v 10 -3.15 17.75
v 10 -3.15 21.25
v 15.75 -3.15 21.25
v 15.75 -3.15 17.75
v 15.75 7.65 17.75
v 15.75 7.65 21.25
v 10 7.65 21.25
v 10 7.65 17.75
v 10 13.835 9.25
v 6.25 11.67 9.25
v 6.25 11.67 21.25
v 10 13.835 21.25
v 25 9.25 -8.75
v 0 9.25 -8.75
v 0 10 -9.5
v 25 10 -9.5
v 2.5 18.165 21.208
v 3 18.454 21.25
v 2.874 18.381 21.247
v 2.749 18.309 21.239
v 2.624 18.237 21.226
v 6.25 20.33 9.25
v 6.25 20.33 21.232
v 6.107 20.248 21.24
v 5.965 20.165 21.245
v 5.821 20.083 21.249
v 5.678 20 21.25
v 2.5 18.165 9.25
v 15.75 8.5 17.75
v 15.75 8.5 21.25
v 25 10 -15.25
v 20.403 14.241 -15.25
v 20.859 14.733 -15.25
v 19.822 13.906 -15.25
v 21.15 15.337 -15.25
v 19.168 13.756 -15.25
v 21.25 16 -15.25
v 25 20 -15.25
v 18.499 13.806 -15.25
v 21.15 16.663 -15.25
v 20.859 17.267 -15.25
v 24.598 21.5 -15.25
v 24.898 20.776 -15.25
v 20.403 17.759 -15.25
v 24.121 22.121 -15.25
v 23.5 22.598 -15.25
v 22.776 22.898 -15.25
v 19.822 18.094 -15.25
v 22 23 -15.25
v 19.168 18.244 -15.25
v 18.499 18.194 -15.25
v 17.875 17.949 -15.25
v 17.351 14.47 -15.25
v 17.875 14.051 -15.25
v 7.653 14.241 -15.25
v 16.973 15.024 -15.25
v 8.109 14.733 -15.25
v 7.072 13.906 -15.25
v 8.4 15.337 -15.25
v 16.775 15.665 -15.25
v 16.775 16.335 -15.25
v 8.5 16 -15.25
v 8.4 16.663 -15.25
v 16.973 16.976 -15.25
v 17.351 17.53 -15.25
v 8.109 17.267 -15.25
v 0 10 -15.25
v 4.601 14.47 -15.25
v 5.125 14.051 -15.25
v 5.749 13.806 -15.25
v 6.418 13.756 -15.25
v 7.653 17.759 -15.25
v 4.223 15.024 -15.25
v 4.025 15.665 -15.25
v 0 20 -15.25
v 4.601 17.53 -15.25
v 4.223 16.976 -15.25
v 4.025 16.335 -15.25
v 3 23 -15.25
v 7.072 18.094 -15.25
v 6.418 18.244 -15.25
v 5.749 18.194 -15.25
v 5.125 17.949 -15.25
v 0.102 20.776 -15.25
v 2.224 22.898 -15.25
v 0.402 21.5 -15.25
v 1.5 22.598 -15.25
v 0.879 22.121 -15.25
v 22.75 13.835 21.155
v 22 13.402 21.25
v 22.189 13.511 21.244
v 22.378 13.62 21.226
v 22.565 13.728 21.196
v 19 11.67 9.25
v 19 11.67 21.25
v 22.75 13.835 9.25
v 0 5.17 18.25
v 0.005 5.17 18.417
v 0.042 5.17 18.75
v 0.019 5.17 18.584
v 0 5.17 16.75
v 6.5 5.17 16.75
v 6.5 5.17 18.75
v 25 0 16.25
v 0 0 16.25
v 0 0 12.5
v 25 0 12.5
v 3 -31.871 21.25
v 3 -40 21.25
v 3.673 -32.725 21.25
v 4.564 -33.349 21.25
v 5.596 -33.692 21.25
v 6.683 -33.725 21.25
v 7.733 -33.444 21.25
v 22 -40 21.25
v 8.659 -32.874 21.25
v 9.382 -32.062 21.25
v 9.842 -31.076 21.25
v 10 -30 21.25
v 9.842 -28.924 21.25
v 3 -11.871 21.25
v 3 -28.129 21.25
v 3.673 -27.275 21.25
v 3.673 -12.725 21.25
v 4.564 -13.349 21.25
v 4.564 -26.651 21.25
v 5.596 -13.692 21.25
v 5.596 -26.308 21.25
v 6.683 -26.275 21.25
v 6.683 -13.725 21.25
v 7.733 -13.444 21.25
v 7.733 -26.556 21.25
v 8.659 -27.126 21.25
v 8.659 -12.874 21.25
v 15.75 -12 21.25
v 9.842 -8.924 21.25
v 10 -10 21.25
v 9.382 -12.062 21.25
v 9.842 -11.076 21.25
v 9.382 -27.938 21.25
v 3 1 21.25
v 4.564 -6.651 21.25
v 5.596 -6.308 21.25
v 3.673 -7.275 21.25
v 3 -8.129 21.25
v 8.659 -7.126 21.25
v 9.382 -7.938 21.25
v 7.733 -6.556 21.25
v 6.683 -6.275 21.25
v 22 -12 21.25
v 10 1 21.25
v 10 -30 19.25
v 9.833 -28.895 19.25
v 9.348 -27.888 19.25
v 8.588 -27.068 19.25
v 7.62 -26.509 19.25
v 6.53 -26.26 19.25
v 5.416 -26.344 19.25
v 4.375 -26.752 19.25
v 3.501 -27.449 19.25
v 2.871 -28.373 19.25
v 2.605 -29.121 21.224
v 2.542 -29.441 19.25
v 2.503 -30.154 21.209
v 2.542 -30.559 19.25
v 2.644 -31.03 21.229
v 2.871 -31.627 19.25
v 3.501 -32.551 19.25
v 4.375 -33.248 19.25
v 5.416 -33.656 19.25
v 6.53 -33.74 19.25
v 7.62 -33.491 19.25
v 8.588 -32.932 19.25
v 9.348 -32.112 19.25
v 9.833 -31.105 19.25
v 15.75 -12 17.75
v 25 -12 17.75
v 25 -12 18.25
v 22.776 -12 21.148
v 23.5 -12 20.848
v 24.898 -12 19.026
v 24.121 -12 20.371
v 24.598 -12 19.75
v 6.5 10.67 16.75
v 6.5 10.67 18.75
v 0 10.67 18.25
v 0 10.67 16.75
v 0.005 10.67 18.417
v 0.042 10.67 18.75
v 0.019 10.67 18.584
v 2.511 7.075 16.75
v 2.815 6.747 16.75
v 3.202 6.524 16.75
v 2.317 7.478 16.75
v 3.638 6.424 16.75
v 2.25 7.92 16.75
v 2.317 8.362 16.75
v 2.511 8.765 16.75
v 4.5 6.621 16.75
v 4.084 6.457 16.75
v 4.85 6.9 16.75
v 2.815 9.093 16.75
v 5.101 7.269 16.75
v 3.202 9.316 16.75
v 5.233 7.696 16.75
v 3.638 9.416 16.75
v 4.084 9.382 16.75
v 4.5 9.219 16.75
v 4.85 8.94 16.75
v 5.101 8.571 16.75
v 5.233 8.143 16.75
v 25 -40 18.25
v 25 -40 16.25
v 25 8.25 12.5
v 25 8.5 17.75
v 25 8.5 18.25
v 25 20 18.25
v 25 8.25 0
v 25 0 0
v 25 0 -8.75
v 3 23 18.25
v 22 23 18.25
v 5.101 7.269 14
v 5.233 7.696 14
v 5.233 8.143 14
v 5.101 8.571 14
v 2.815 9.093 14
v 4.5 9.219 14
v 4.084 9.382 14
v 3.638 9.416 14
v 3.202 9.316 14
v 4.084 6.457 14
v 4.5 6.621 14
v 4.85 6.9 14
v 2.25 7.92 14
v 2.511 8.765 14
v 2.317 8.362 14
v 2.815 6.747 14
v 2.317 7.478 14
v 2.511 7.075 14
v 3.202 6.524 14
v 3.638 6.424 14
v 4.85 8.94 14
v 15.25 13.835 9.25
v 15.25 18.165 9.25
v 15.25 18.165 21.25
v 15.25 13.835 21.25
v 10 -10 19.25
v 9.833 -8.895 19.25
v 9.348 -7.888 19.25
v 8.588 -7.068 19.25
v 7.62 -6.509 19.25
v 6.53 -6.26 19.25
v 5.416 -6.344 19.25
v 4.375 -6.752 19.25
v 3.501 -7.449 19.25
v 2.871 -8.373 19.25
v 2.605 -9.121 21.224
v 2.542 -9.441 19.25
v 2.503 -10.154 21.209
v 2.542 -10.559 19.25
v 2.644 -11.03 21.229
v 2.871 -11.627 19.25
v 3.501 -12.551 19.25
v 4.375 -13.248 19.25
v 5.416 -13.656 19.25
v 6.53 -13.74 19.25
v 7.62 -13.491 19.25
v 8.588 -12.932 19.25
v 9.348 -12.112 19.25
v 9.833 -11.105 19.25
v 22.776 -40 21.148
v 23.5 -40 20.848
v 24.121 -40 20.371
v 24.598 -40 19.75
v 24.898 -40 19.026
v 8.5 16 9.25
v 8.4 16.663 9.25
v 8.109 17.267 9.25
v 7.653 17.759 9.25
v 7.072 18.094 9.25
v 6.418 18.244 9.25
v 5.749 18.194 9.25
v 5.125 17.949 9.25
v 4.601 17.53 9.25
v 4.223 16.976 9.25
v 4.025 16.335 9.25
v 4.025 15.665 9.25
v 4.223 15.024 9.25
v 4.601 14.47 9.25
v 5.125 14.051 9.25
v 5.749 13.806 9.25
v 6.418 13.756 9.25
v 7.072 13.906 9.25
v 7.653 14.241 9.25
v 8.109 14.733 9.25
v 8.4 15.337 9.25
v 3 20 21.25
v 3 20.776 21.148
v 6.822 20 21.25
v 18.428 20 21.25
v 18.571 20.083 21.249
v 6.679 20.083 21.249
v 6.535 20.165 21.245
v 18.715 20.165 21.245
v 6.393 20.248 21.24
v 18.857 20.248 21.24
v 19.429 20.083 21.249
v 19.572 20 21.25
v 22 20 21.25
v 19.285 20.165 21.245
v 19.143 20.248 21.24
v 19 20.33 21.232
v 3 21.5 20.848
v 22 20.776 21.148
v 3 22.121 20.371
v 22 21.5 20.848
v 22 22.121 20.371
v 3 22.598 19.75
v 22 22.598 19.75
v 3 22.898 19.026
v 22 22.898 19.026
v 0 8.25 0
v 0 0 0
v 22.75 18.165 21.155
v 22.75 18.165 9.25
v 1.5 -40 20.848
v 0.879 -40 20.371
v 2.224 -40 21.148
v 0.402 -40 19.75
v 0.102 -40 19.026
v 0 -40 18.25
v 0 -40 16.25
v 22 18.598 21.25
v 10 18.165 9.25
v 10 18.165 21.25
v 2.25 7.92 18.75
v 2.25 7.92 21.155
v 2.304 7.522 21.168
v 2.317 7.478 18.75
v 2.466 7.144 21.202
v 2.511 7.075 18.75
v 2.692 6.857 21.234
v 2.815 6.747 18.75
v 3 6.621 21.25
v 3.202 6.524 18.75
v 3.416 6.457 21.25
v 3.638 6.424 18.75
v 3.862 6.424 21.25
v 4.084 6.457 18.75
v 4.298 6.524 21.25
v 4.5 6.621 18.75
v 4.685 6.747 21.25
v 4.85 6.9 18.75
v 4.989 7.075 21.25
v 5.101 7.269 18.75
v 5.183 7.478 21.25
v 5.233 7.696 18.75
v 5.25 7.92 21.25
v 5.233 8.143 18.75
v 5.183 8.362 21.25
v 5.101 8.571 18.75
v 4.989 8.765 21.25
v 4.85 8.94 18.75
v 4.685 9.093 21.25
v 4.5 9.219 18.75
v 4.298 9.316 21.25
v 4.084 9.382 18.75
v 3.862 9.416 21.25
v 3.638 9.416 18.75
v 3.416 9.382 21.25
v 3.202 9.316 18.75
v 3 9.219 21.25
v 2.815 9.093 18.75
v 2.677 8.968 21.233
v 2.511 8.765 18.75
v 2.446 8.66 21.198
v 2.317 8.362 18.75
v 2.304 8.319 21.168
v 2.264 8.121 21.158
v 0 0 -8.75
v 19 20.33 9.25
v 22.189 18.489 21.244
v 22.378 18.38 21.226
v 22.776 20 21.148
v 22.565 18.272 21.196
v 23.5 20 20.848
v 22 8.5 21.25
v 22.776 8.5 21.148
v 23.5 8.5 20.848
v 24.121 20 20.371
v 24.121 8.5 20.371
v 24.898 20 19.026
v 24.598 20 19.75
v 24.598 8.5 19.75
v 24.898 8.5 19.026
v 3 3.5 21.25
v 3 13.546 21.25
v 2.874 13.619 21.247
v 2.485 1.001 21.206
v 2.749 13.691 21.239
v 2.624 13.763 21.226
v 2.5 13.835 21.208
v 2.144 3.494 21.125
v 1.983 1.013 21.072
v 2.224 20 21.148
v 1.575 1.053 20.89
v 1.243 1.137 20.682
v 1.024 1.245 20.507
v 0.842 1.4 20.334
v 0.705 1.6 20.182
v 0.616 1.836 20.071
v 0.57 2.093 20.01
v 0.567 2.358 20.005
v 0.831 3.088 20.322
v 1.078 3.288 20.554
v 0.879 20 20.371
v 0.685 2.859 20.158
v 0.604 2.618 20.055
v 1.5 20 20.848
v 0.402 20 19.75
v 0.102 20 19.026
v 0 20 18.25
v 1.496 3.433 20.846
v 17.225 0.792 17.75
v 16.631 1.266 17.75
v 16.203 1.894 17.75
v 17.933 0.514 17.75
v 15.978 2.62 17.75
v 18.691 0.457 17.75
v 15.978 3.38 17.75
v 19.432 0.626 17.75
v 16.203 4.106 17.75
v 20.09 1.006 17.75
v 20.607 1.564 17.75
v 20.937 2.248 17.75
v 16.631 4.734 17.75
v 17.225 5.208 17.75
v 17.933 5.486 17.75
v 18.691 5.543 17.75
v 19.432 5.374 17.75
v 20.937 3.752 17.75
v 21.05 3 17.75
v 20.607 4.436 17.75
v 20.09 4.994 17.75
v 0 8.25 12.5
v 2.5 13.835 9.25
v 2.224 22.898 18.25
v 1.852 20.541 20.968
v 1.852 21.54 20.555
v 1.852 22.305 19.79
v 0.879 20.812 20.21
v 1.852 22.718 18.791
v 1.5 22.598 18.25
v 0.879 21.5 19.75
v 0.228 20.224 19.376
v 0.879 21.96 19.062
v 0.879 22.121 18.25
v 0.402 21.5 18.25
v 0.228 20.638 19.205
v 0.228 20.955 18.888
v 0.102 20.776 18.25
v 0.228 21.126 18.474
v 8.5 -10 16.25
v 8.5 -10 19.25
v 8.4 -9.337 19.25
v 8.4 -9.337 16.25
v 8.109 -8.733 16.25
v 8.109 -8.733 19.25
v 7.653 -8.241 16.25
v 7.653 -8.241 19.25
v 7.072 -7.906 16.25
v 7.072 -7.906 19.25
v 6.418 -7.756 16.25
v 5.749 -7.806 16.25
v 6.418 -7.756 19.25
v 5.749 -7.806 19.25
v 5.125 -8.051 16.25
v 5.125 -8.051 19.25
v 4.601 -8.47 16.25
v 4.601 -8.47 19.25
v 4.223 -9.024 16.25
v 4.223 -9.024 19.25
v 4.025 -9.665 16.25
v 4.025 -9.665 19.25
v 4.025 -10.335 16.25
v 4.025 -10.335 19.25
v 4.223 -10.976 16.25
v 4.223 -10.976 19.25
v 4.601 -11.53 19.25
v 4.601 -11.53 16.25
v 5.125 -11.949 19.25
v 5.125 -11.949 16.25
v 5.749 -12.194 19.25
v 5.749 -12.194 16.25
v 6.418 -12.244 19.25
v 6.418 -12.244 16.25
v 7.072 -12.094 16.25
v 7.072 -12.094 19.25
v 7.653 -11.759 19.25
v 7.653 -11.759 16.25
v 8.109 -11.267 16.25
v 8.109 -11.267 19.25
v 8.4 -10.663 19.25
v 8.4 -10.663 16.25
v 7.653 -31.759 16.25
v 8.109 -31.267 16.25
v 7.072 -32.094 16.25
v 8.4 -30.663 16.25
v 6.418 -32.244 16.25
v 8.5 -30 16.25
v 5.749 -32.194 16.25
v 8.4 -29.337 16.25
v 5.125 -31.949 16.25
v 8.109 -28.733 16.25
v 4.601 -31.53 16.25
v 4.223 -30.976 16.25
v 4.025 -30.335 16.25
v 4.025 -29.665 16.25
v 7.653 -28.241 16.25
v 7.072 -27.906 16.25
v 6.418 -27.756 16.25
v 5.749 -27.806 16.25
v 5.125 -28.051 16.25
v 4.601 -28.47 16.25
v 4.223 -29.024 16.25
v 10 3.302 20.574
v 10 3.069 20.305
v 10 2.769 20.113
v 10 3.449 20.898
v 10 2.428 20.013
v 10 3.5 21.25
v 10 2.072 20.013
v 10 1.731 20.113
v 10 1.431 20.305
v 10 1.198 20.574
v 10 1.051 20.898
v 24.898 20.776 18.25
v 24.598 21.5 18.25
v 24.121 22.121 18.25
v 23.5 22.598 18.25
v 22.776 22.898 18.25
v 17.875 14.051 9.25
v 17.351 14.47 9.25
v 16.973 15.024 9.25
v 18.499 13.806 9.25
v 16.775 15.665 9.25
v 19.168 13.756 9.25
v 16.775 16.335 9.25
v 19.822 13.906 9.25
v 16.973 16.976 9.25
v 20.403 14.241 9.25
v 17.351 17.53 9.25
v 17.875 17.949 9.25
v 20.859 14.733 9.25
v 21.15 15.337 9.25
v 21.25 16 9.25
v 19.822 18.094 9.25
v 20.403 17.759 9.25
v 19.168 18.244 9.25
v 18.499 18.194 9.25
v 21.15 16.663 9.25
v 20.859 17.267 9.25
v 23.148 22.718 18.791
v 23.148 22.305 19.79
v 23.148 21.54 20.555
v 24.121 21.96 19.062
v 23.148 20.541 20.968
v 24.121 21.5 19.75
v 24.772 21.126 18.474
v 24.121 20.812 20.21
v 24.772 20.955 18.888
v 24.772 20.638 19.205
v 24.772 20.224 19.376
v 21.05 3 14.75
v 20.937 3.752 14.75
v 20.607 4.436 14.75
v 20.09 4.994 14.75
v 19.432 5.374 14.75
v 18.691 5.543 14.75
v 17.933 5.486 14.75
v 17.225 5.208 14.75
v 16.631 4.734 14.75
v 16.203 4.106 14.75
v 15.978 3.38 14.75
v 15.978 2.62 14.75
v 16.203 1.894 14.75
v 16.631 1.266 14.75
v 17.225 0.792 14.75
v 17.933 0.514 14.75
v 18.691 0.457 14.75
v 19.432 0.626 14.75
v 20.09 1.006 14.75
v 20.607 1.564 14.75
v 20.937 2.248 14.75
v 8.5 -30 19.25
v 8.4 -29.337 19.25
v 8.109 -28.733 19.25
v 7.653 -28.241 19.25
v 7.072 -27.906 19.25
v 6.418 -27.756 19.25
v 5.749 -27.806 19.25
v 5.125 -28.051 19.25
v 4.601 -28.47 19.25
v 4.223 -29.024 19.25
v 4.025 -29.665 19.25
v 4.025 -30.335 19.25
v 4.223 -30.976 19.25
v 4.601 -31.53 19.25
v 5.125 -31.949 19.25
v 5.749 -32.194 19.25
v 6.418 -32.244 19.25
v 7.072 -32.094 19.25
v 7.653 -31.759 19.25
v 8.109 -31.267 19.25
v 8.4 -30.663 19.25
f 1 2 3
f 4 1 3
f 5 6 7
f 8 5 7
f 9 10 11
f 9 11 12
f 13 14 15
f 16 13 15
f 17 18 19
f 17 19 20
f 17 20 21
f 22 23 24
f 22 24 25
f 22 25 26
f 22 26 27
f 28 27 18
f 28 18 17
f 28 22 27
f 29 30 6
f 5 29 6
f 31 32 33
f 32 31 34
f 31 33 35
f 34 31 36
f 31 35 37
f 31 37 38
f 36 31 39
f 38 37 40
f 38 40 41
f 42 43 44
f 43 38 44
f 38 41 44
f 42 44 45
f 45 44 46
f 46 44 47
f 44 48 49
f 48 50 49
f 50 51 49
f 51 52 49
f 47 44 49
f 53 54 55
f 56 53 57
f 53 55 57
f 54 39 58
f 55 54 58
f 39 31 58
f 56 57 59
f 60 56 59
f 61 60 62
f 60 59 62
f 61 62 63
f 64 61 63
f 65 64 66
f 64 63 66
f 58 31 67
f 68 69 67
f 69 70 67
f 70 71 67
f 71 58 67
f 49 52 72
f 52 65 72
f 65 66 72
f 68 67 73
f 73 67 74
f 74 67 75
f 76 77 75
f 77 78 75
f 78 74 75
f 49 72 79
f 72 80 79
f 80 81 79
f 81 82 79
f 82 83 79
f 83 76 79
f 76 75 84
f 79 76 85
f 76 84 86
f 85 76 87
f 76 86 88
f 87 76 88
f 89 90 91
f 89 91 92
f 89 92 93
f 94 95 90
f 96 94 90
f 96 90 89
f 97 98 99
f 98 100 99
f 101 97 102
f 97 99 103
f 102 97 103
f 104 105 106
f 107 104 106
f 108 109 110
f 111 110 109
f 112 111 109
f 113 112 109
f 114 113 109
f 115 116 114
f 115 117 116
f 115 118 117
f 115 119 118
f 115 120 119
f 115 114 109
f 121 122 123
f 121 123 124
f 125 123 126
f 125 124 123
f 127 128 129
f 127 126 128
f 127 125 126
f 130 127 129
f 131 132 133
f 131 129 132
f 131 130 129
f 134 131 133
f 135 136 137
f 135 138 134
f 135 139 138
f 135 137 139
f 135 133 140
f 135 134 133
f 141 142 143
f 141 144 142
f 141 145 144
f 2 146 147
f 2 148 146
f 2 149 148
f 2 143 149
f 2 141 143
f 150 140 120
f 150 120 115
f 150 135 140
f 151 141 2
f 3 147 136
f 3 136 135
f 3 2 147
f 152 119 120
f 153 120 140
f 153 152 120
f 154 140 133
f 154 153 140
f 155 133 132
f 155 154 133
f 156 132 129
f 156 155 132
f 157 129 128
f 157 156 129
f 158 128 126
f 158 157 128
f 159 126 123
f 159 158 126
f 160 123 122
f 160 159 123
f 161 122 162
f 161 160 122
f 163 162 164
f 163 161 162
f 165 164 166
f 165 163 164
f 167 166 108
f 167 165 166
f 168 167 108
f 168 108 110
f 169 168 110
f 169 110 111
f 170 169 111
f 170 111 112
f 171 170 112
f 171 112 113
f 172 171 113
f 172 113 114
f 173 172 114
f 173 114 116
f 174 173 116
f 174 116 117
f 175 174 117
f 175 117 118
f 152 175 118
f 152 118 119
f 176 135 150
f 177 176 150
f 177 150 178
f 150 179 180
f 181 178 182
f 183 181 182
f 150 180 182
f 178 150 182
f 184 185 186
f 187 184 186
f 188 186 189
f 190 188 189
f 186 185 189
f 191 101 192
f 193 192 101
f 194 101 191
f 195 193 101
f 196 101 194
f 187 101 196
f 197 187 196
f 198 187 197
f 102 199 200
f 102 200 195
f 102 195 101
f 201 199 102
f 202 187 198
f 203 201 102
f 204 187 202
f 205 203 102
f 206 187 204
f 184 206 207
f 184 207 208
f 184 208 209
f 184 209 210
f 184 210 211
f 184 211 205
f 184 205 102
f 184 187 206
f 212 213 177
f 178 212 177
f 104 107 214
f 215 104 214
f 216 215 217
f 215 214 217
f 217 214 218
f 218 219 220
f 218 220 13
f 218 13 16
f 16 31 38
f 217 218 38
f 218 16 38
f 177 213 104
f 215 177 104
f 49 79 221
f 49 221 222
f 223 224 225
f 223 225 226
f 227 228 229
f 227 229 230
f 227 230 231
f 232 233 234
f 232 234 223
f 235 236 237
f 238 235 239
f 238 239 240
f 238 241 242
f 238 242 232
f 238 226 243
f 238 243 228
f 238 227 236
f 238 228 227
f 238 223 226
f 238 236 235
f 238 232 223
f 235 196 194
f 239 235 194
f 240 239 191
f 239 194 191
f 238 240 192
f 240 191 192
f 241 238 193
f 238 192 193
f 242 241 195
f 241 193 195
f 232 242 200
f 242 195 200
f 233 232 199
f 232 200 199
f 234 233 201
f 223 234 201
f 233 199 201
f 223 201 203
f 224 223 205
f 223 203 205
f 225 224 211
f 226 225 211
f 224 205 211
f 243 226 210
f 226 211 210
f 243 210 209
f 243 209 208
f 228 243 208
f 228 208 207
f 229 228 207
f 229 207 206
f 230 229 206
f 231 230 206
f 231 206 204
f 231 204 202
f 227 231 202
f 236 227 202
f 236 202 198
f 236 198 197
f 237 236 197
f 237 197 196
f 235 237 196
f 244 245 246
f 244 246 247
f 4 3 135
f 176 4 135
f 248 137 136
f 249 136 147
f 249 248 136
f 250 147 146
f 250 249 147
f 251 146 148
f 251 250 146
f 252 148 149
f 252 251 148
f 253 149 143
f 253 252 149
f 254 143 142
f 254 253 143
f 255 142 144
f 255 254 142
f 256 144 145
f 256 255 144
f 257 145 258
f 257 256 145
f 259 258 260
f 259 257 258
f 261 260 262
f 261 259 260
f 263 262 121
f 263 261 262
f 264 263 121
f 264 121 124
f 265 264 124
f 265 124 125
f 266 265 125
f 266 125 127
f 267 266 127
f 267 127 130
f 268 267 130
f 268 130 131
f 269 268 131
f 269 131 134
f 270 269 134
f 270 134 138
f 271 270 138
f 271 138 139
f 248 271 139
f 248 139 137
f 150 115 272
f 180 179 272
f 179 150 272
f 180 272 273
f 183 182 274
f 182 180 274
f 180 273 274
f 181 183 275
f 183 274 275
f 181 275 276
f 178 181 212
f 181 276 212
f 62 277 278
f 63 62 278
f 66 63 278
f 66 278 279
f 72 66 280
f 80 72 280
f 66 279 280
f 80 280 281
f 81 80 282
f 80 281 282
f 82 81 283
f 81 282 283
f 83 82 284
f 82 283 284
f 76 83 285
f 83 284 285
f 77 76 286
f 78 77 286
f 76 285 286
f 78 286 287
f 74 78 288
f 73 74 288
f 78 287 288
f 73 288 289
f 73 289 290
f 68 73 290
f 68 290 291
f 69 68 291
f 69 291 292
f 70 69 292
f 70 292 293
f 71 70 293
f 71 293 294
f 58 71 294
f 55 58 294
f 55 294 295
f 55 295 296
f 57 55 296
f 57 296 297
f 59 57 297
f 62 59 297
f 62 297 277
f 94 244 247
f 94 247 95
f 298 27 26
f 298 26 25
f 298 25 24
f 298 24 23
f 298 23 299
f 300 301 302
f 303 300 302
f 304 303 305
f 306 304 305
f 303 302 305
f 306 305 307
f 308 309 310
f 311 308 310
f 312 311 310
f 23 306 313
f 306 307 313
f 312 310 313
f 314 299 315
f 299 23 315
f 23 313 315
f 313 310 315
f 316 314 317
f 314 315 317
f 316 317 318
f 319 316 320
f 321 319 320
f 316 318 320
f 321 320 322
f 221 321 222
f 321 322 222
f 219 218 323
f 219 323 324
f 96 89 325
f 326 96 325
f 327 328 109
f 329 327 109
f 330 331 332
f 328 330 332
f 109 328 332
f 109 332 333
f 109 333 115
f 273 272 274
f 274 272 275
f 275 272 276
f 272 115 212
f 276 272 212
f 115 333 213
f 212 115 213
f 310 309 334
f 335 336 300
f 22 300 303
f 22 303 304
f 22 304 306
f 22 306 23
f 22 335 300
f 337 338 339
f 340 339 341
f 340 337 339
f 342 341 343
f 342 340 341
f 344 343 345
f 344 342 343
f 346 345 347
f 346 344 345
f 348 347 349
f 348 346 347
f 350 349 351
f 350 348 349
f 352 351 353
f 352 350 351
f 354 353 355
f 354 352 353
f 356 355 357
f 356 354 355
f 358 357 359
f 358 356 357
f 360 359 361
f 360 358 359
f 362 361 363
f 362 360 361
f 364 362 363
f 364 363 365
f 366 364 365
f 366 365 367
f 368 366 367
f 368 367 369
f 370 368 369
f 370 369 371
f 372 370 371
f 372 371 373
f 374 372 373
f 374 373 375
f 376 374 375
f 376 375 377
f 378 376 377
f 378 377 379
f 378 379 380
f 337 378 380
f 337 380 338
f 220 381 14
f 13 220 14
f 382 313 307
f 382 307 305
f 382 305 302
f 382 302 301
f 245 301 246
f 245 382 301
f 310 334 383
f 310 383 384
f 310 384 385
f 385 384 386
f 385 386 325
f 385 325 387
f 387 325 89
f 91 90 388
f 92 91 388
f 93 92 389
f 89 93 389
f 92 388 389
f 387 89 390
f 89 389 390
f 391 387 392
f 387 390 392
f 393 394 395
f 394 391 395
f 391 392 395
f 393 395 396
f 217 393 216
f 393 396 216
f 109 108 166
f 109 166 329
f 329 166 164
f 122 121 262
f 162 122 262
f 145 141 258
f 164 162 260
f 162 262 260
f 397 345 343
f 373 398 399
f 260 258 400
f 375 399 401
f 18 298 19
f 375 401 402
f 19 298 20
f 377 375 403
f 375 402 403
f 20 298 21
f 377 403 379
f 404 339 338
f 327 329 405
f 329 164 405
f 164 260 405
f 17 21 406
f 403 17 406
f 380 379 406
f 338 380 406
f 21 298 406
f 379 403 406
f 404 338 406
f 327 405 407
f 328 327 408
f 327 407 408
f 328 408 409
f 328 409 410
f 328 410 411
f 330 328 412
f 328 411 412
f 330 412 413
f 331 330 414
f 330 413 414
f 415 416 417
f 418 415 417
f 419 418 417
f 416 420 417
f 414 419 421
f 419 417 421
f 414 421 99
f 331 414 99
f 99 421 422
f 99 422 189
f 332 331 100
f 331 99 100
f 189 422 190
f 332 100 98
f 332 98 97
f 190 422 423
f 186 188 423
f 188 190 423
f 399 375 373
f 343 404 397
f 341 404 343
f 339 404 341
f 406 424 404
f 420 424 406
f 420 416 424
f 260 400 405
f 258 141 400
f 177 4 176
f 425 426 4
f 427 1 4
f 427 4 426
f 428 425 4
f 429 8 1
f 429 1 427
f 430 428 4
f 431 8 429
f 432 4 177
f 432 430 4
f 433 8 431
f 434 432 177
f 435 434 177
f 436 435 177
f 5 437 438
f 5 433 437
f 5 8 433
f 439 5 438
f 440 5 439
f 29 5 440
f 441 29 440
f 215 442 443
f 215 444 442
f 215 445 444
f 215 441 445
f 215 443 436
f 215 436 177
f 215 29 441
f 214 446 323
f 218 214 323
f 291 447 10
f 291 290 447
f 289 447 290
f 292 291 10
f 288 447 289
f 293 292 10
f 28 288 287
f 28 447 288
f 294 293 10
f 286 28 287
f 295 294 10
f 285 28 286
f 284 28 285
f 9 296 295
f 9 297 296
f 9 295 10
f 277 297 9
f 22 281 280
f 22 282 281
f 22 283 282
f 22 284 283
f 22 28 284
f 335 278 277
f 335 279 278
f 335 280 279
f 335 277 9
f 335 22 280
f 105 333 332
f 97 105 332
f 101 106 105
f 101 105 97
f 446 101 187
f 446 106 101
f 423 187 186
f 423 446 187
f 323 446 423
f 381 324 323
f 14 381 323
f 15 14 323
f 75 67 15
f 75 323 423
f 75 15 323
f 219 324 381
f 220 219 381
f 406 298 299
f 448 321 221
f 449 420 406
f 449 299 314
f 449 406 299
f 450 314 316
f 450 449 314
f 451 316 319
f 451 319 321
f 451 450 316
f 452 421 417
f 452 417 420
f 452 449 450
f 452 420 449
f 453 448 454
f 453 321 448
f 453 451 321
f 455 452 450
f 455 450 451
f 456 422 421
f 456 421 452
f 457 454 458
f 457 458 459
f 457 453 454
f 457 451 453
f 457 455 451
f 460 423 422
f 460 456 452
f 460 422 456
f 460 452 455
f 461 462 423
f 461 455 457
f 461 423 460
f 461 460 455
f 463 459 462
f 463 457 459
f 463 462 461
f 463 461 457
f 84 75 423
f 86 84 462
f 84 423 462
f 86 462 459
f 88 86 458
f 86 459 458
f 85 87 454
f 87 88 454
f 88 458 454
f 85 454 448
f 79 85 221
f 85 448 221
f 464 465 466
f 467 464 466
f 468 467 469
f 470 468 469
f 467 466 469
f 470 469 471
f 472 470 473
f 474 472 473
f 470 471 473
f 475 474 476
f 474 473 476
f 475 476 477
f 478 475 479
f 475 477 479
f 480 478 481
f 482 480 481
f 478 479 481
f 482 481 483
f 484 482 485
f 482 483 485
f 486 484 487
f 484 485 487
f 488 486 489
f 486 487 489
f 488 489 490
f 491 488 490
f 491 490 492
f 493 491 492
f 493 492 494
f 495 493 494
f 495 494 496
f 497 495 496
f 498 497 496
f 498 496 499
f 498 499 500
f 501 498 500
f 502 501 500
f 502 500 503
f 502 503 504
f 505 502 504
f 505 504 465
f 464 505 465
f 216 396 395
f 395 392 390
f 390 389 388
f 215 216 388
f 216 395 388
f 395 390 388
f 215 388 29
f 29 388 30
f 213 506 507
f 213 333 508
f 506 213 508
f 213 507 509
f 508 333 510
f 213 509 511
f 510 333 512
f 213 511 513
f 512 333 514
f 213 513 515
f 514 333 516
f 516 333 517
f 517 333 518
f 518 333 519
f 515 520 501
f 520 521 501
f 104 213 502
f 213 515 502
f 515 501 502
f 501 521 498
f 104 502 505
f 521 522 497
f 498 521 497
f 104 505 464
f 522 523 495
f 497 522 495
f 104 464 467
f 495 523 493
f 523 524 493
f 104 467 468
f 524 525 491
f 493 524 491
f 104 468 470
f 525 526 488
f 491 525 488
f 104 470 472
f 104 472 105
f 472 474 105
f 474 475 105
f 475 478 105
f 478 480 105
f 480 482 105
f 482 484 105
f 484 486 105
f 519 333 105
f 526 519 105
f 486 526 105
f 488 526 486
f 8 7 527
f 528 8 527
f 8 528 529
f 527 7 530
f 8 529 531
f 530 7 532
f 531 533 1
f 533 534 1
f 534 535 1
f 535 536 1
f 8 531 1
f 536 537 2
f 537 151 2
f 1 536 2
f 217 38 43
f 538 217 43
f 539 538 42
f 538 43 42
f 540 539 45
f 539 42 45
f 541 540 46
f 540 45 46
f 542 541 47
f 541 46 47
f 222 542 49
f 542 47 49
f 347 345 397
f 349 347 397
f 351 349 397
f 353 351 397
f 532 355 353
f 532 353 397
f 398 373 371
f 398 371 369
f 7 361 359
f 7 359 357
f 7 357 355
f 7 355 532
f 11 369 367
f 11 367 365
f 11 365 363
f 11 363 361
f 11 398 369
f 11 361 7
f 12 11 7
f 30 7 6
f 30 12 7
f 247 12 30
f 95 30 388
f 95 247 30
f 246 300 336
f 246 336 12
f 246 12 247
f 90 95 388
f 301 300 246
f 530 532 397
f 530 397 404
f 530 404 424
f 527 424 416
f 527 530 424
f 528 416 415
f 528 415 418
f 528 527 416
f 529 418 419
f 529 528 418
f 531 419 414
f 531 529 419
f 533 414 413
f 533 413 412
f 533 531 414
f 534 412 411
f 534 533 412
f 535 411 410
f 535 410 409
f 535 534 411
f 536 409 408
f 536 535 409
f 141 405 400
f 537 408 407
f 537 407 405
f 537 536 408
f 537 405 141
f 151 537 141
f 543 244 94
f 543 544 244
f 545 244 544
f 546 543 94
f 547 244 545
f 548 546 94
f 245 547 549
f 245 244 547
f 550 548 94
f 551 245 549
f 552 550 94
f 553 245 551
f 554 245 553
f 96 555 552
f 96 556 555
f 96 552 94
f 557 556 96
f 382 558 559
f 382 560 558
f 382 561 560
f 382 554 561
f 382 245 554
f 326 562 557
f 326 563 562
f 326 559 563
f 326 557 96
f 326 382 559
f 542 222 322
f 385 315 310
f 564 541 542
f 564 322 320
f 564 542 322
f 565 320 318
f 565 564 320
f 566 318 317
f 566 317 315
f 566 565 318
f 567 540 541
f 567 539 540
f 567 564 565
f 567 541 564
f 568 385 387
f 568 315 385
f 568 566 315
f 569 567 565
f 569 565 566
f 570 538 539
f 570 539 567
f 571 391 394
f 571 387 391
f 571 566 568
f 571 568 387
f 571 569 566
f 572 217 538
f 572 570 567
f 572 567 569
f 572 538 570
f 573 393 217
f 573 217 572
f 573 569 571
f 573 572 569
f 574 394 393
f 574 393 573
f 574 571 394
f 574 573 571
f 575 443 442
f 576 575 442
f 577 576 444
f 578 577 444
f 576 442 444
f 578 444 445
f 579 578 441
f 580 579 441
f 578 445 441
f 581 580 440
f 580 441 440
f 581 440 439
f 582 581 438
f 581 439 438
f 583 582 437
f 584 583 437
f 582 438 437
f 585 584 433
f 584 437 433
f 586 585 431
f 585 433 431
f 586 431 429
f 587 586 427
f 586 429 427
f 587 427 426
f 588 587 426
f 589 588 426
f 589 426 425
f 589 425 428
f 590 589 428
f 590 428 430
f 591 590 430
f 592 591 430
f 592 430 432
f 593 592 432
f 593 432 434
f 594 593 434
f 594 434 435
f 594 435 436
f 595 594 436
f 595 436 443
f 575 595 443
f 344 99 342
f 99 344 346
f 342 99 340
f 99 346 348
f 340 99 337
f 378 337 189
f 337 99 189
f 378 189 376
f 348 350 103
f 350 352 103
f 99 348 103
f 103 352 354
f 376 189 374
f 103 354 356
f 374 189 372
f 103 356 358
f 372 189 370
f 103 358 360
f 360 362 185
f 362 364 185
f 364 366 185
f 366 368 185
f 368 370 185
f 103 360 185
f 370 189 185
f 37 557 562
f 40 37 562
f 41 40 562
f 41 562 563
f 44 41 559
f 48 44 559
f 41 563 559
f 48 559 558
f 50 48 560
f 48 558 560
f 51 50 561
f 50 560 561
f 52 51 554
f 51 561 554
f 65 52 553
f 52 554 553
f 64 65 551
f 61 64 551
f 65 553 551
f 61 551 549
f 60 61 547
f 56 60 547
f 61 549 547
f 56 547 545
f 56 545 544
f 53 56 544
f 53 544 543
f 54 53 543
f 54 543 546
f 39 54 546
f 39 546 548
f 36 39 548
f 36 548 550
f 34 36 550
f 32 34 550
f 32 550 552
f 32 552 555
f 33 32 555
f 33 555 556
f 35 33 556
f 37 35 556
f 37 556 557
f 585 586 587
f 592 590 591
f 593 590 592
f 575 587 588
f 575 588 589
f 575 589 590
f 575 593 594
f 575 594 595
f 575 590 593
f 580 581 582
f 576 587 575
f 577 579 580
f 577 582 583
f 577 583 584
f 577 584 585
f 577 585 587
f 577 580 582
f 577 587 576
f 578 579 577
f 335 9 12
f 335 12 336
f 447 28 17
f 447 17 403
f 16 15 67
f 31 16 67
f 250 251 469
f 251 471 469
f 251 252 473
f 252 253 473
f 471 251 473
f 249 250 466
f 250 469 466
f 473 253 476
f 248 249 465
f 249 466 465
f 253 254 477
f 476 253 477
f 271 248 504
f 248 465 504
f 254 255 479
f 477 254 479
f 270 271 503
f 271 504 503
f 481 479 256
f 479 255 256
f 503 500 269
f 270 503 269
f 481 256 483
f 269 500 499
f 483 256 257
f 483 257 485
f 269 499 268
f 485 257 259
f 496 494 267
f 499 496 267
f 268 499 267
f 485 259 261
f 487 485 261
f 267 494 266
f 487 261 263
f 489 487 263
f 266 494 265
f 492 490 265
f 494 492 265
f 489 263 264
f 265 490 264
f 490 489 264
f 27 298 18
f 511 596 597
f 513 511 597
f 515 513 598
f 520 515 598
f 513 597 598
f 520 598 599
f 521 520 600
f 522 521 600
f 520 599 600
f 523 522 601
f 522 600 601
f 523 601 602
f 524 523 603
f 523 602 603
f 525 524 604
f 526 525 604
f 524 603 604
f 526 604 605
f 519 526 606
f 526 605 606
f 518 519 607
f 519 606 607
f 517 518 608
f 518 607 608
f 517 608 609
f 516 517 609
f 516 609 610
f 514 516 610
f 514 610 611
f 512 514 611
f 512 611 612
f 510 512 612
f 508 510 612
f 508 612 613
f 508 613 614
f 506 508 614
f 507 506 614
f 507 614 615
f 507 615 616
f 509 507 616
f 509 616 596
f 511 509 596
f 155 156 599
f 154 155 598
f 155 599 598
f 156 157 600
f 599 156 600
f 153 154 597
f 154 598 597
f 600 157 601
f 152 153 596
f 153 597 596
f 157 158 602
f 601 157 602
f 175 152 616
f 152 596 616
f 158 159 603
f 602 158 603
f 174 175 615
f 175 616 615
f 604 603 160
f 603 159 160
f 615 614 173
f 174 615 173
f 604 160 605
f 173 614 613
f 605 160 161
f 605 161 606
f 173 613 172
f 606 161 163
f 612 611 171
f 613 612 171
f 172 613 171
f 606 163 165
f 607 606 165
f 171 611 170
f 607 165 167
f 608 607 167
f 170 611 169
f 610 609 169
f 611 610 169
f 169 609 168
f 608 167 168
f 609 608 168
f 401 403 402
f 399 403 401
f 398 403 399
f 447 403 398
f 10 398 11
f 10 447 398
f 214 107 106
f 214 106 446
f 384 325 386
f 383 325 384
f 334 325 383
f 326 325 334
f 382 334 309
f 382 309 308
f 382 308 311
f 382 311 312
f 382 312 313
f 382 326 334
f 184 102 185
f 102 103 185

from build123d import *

# Parameters (mm, degrees)
BOSS_EXTRUDE1_DEPTH            = 25
CUT_EXTRUDE1_REACH             = 60.44
SKETCH2_R                      = 2.25
SKETCH3_W                      = 25
SKETCH3_H                      = 63
SKETCH3_R                      = 3.75
BOSS_EXTRUDE2_DEPTH            = 2
FILLET1_R                      = 3
SKETCH4_R                      = 2.55
CUT_EXTRUDE2_DEPTH             = 3.5
SKETCH4_3_R                    = 2.55
CUT_EXTRUDE5_DEPTH             = 6.5
SKETCH6_W                      = 10
SKETCH6_H                      = 1.25
SKETCH5_R                      = 1.5
CUT_EXTRUDE3_DEPTH             = 1
SKETCH5_2_R                    = 1.5
CUT_EXTRUDE4_DEPTH             = 3.75
CUT_EXTRUDE4_DIRECTION_2_REACH = 59.567
CUT_EXTRUDE6_DEPTH             = 10


with BuildPart() as part:
    # Sketch1 → Boss-Extrude1 (new body)
    with BuildSketch(Plane(origin=(0, 0, 0), x_dir=(0, 0, -1), z_dir=(1, 0, 0))):
        Polygon((8.75, 0), (8.75, 9.25), (9.5, 10), (15.25, 10), (15.25, 23), (-19.25, 23), (-19.25, -40), (-16.25, -40), (-16.25, 0), (-12.5, 0), (-12.5, 8.25), (0, 8.25), (0, 0), (3.75, 0), align=None)
    extrude(amount=BOSS_EXTRUDE1_DEPTH)

    # Sketch2 → Cut-Extrude1 (cut, up to next)
    with BuildSketch(Plane.XY.offset(19.25), mode=Mode.PRIVATE) as cut_extrude1_sk1:
        with Locations((6.25, -30)):
            Circle(SKETCH2_R)
    cut_extrude1_tool1 = extrude(cut_extrude1_sk1.sketch, amount=-CUT_EXTRUDE1_REACH, mode=Mode.PRIVATE) & part.part
    # Sketch2 → Cut-Extrude1 (cut, up to next)
    with BuildSketch(Plane.XY.offset(19.25), mode=Mode.PRIVATE) as cut_extrude1_sk2:
        with Locations((6.25, -10)):
            Circle(SKETCH2_R)
    cut_extrude1_tool2 = extrude(cut_extrude1_sk2.sketch, amount=-CUT_EXTRUDE1_REACH, mode=Mode.PRIVATE) & part.part
    # Sketch2 → Cut-Extrude1 (cut, up to next)
    with BuildSketch(Plane.XY.offset(19.25), mode=Mode.PRIVATE) as cut_extrude1_sk3:
        with Locations((6.25, 16)):
            Circle(SKETCH2_R)
    cut_extrude1_tool3 = extrude(cut_extrude1_sk3.sketch, amount=-CUT_EXTRUDE1_REACH, mode=Mode.PRIVATE) & part.part
    # Sketch2 → Cut-Extrude1 (cut, up to next)
    with BuildSketch(Plane.XY.offset(19.25), mode=Mode.PRIVATE) as cut_extrude1_sk4:
        with Locations((19, 16)):
            Circle(SKETCH2_R)
    cut_extrude1_tool4 = extrude(cut_extrude1_sk4.sketch, amount=-CUT_EXTRUDE1_REACH, mode=Mode.PRIVATE) & part.part
    add(cut_extrude1_tool1.solids().sort_by_distance((6.25, -30, 19.25))[0], mode=Mode.SUBTRACT)
    add(cut_extrude1_tool2.solids().sort_by_distance((6.25, -10, 19.25))[0], mode=Mode.SUBTRACT)
    add(cut_extrude1_tool3.solids().sort_by_distance((6.25, 16, 19.25))[0], mode=Mode.SUBTRACT)
    add(cut_extrude1_tool4.solids().sort_by_distance((19, 16, 19.25))[0], mode=Mode.SUBTRACT)

    # Sketch3 → Boss-Extrude2 (add)
    with BuildSketch(Plane.XY.offset(19.25)):
        with Locations((12.5, -8.5)):
            Rectangle(SKETCH3_W, SKETCH3_H)
        with Locations((6.25, -30)):
            Circle(SKETCH3_R, mode=Mode.SUBTRACT)
        with Locations((6.25, -10)):
            Circle(SKETCH3_R, mode=Mode.SUBTRACT)
        Polygon((10, 18.165063509), (6.25, 20.330127019), (2.5, 18.165063509), (2.5, 13.834936491), (6.25, 11.669872981), (10, 13.834936491), align=None, mode=Mode.SUBTRACT)
        Polygon((19, 20.330127019), (15.25, 18.165063509), (15.25, 13.834936491), (19, 11.669872981), (22.75, 13.834936491), (22.75, 18.165063509), align=None, mode=Mode.SUBTRACT)
    extrude(amount=BOSS_EXTRUDE2_DEPTH)

    # Fillet1
    # the kernel refuses this fillet: 3 mm, written as the material it takes off along each edge
    with BuildSketch(Plane(origin=(3, 20, 18.25), x_dir=(0, 0, 1), z_dir=(-1, 0, 0))) as fillet1_piece_1_section:
        Polygon((0, 0), (FILLET1_R, 0), (FILLET1_R, FILLET1_R), (0, FILLET1_R), align=None)
    fillet1_piece_1 = extrude(amount=FILLET1_R, mode=Mode.PRIVATE)
    fillet1_piece_1 = fillet1_piece_1 - Plane(origin=(3, 20, 18.25), x_dir=(0, -0.7071067811865475, -0.7071067811865475), z_dir=(-1, 0, 0)) * Sphere(FILLET1_R, mode=Mode.PRIVATE)
    add(fillet1_piece_1, mode=Mode.SUBTRACT)
    with BuildSketch(Plane(origin=(22, 20, 18.25), x_dir=(0, 0, 1), z_dir=(1, 0, 0))) as fillet1_piece_2_section:
        Polygon((0, 0), (FILLET1_R, 0), (FILLET1_R, -FILLET1_R), (0, -FILLET1_R), align=None)
    fillet1_piece_2 = extrude(amount=FILLET1_R, mode=Mode.PRIVATE)
    fillet1_piece_2 = fillet1_piece_2 - Plane(origin=(22, 20, 18.25), x_dir=(0, -0.7071067811865475, -0.7071067811865475), z_dir=(1, 0, 0)) * Sphere(FILLET1_R, mode=Mode.PRIVATE)
    add(fillet1_piece_2, mode=Mode.SUBTRACT)
    with BuildSketch(Plane(origin=(0, 23, 18.25), x_dir=(1, 0, 0), z_dir=(0, 0, -1))) as fillet1_piece_3:
        with BuildLine():
            CenterArc((FILLET1_R, FILLET1_R), FILLET1_R, 180, 90)
            Line((0, FILLET1_R), (0, 0))
            Line((0, 0), (FILLET1_R, 0))
        make_face()
    extrude(amount=41, mode=Mode.SUBTRACT)
    with BuildSketch(Plane(origin=(25, 23, -22.75), x_dir=(0, -1, 0), z_dir=(0, 0, 1))) as fillet1_piece_4:
        with BuildLine():
            CenterArc((FILLET1_R, -FILLET1_R), FILLET1_R, 90, 90)
            Line((0, -FILLET1_R), (0, 0))
            Line((0, 0), (FILLET1_R, 0))
        make_face()
    extrude(amount=41, mode=Mode.SUBTRACT)
    with BuildSketch(Plane(origin=(22, 23, 21.25), x_dir=(0, -1, 0), z_dir=(-1, 0, 0))) as fillet1_piece_5:
        with BuildLine():
            CenterArc((FILLET1_R, -FILLET1_R), FILLET1_R, 90, 90)
            Line((0, -FILLET1_R), (0, 0))
            Line((0, 0), (FILLET1_R, 0))
        make_face()
    extrude(amount=19, mode=Mode.SUBTRACT)
    with BuildSketch(Plane(origin=(25, -47.5, 21.25), x_dir=(0, 0, -1), z_dir=(0, 1, 0))) as fillet1_piece_6:
        with BuildLine():
            CenterArc((FILLET1_R, FILLET1_R), FILLET1_R, 180, 90)
            Line((0, FILLET1_R), (0, 0))
            Line((0, 0), (FILLET1_R, 0))
        make_face()
    extrude(amount=67.5, mode=Mode.SUBTRACT)
    with BuildSketch(Plane(origin=(0, 20, 21.25), x_dir=(1, 0, 0), z_dir=(0, -1, 0))) as fillet1_piece_7:
        with BuildLine():
            CenterArc((FILLET1_R, -FILLET1_R), FILLET1_R, 90, 90)
            Line((0, -FILLET1_R), (0, 0))
            Line((0, 0), (FILLET1_R, 0))
        make_face()
    extrude(amount=67.5, mode=Mode.SUBTRACT)

    # Sketch4 → Cut-Extrude2 (cut)
    with BuildSketch(Plane.XY.offset(21.25)):
        Polygon((15.75, -12), (25, -12), (25, 8.5), (15.75, 8.5), (15.75, 7.65), (10, 7.65), (10, -3.15), (15.75, -3.15), align=None)
        with Locations((18.5, 3)):
            Circle(SKETCH4_R, mode=Mode.SUBTRACT)
    extrude(amount=-CUT_EXTRUDE2_DEPTH, mode=Mode.SUBTRACT)

    # Sketch4<3> → Cut-Extrude5 (cut)
    with BuildSketch(Plane.XY.offset(21.25)):
        with Locations((18.5, 3)):
            Circle(SKETCH4_3_R)
    extrude(amount=-CUT_EXTRUDE5_DEPTH, mode=Mode.SUBTRACT)

    # Sketch6 → Cut-Revolve1 (revolve, cut)
    with BuildSketch(Plane.XY.offset(21.25)):
        with Locations((5, 2.875)):
            Rectangle(SKETCH6_W, SKETCH6_H)
    revolve(axis=Axis((10, 2.25, 21.25), (-1, 0, 0)), mode=Mode.SUBTRACT)

    # Sketch5 → Cut-Extrude3 (cut, symmetric)
    with BuildSketch(Plane.XY.offset(17.75)):
        Polygon((1, 5.169872981), (6.5, 5.169872981), (6.5, 10.669872981), (1, 10.669872981), (0, 10.669872981), (0, 5.169872981), align=None)
        with Locations((3.75, 7.919872981)):
            Circle(SKETCH5_R, mode=Mode.SUBTRACT)
    extrude(amount=CUT_EXTRUDE3_DEPTH, both=True, mode=Mode.SUBTRACT)

    # Sketch5<2> → Cut-Extrude4 (cut)
    with BuildSketch(Plane.XY.offset(17.75)):
        with Locations(Location((3.75, 7.919872981, 0), (0, 0, 180))):
            Circle(SKETCH5_2_R)
    extrude(amount=-CUT_EXTRUDE4_DEPTH, mode=Mode.SUBTRACT)

    # Sketch5<2> → Cut-Extrude4 direction 2 (cut, up to next)
    with BuildSketch(Plane.XY.offset(17.75), mode=Mode.PRIVATE) as cut_extrude4_direction_2_sk1:
        with Locations(Location((3.75, 7.919872981, 0), (0, 0, 180))):
            Circle(SKETCH5_2_R)
    cut_extrude4_direction_2_tool1 = extrude(cut_extrude4_direction_2_sk1.sketch, amount=CUT_EXTRUDE4_DIRECTION_2_REACH, mode=Mode.PRIVATE) & part.part
    add(cut_extrude4_direction_2_tool1.solids().sort_by_distance((3.75, 7.919873, 17.75))[0], mode=Mode.SUBTRACT)

    # Sketch7 → Cut-Extrude6 (cut)
    with BuildSketch(Plane.XY.offset(19.25)):
        Polygon((22.75, 13.834936491), (22.75, 18.165063509), (19, 20.330127019), (15.25, 18.165063509), (15.25, 13.834936491), (19, 11.669872981), align=None)
        Polygon((6.25, 11.669872981), (10, 13.834936491), (10, 18.165063509), (6.25, 20.330127019), (2.5, 18.165063509), (2.5, 13.834936491), align=None)
    extrude(amount=-CUT_EXTRUDE6_DEPTH, mode=Mode.SUBTRACT)


solid = part.part
